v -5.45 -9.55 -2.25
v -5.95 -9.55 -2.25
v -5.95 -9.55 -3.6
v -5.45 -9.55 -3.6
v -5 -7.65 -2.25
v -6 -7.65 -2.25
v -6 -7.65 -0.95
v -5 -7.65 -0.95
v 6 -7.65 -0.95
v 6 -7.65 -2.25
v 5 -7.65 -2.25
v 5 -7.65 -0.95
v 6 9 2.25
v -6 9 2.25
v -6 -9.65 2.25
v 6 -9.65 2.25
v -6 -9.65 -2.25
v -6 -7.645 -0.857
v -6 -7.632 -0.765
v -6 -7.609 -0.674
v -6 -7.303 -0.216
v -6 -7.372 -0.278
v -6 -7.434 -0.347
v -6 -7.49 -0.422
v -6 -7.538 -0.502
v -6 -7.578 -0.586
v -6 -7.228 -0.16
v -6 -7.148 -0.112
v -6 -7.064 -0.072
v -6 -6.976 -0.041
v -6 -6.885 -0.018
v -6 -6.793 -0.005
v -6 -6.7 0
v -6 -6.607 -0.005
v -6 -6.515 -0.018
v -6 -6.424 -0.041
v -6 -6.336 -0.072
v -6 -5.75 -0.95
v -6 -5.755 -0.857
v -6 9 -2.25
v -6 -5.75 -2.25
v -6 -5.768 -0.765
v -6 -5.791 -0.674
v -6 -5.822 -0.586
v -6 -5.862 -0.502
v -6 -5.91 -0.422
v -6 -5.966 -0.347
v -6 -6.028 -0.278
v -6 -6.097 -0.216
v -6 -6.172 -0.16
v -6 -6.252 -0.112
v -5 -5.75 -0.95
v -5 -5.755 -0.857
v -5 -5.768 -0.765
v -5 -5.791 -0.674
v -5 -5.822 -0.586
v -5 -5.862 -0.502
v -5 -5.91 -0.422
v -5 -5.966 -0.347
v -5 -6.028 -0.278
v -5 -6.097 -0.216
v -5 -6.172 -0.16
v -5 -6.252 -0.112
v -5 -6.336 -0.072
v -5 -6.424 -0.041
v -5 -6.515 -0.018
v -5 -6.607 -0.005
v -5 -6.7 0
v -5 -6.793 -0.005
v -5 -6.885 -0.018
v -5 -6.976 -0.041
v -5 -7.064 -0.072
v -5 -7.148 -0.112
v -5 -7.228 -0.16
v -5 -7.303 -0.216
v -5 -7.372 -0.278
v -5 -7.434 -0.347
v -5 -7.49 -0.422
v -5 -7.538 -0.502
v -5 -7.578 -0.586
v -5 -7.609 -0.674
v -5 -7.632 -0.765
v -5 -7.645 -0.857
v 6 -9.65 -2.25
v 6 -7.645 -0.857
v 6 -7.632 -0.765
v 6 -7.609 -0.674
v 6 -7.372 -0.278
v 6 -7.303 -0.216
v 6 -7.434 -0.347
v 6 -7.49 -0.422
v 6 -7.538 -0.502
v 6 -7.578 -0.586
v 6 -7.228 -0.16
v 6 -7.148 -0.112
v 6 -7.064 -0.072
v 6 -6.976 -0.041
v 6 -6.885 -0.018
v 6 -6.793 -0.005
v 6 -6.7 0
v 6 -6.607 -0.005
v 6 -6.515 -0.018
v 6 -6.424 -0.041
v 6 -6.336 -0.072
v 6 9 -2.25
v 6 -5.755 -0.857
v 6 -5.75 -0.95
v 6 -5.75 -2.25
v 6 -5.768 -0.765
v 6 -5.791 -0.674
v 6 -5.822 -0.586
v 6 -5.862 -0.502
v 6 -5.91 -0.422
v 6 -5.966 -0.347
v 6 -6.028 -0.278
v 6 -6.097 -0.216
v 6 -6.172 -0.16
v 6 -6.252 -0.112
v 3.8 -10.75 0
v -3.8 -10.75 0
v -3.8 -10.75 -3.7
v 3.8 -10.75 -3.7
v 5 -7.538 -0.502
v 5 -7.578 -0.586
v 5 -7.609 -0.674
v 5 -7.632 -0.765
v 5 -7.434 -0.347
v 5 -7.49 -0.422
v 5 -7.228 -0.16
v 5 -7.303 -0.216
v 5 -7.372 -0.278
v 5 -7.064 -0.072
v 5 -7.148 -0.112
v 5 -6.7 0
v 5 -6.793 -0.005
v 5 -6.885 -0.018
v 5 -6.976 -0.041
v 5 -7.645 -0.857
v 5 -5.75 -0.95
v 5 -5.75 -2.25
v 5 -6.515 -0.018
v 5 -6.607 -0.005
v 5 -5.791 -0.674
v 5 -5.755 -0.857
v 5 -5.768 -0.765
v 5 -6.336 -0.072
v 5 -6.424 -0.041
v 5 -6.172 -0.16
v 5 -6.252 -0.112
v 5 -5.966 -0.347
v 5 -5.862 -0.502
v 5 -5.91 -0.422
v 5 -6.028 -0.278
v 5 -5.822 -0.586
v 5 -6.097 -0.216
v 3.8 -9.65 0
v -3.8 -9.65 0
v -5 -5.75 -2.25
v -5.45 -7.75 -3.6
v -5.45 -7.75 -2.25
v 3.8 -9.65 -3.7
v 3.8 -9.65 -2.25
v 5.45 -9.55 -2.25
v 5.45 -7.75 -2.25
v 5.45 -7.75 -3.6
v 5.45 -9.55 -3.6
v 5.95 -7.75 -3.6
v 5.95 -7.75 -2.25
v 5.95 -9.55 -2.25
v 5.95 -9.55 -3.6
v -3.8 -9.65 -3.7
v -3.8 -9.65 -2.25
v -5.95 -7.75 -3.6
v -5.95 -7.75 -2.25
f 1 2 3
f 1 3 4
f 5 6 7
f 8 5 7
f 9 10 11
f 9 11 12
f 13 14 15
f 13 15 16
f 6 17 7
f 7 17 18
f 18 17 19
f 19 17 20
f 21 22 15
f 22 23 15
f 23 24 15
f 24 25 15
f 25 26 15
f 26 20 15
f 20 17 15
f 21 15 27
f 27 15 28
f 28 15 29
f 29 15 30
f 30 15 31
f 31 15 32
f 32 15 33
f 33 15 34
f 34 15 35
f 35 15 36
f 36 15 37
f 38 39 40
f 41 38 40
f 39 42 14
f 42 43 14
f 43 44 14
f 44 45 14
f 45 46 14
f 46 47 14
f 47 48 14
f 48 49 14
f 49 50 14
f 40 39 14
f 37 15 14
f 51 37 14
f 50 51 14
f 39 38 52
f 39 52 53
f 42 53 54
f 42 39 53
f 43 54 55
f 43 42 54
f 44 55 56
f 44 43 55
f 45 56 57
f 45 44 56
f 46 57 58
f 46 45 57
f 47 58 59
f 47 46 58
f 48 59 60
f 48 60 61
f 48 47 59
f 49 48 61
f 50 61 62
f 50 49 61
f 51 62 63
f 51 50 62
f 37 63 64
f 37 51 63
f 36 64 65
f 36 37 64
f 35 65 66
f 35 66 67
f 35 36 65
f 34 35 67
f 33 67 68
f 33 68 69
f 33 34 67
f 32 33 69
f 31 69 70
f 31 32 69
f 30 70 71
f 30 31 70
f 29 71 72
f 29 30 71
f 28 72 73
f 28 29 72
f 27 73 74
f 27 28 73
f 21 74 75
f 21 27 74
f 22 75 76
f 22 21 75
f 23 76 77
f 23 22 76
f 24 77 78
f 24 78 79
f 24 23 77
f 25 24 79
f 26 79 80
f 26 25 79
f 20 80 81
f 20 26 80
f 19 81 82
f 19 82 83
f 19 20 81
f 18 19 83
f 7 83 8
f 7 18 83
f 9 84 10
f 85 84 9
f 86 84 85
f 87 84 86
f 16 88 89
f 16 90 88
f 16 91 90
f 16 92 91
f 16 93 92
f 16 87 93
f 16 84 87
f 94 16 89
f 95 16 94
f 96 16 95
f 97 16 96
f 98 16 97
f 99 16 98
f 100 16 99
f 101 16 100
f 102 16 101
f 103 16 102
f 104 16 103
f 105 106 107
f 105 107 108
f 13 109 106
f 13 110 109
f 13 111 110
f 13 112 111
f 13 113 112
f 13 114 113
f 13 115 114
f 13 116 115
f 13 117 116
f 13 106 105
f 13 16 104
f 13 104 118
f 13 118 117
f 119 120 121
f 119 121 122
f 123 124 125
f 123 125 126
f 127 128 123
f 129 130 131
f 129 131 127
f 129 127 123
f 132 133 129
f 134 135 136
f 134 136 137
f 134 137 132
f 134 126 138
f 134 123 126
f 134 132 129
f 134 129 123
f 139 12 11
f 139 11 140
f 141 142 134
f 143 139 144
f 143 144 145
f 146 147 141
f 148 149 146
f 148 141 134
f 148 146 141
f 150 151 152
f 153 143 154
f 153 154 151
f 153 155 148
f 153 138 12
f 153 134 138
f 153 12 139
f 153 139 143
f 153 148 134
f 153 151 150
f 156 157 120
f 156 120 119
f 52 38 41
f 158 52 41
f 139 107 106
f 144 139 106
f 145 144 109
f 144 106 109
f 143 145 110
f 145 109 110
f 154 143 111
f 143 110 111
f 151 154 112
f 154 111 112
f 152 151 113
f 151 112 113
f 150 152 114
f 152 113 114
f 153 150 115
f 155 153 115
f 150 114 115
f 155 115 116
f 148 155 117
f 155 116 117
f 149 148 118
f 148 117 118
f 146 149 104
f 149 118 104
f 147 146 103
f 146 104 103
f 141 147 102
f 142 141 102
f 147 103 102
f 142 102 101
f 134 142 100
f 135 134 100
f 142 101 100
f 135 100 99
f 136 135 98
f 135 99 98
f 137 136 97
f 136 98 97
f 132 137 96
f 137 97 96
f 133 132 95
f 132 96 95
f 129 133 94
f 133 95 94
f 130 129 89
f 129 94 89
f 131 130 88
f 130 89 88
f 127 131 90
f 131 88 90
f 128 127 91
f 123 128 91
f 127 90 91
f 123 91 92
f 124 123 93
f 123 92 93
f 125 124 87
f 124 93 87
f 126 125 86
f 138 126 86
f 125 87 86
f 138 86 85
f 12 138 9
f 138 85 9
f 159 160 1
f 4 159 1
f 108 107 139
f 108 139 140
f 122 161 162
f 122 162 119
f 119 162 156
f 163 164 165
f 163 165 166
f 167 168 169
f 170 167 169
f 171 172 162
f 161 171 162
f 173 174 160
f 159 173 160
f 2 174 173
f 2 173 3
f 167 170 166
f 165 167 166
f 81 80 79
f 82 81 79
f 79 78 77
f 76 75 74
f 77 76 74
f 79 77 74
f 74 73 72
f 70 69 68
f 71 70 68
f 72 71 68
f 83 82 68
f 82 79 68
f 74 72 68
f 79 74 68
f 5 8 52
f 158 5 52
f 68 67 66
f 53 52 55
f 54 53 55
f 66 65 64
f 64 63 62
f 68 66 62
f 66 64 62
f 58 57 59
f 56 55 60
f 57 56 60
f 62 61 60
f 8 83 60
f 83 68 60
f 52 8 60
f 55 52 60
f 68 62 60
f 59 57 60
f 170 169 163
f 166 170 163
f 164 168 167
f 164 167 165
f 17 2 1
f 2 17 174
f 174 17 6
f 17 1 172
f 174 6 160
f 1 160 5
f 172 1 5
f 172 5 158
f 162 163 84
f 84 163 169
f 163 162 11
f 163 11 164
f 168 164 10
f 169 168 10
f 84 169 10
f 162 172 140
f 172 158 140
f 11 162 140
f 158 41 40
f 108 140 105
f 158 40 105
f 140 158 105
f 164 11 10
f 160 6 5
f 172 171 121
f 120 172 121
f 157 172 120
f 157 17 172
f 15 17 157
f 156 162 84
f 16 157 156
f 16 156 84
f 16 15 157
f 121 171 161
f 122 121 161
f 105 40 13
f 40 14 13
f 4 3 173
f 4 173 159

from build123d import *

# Parameters (mm, degrees)
SKETCH006_W     = 12
SKETCH006_H     = 18.65
PAD002_DEPTH    = 2.25
SKETCH007_W     = 7.6
SKETCH007_H     = 3.7
PAD003_DEPTH    = 1.1
SKETCH008_W     = 0.5
SKETCH008_H     = 1.8
PAD004_DEPTH    = 1.35
POCKET003_DEPTH = 1


with BuildPart() as part:
    # Sketch006 → Pad002 (new body, symmetric)
    with BuildSketch(Plane.XY):
        with Locations((0, -0.325)):
            Rectangle(SKETCH006_W, SKETCH006_H)
    extrude(amount=PAD002_DEPTH, both=True)

    # Sketch007 (on Face3 of Pad002) → Pad003 (join)
    with BuildSketch(Plane.XZ.offset(9.65)):
        with Locations((0, -1.85)):
            Rectangle(SKETCH007_W, SKETCH007_H)
    extrude(amount=PAD003_DEPTH)

    # Sketch008 (on Face4 of Pad003) → Pad004 (join)
    with BuildSketch(Plane(origin=(0, 0, -2.25), x_dir=(1, 0, 0), z_dir=(0, 0, -1))):
        with Locations((-5.7, 8.65)):
            Rectangle(SKETCH008_W, SKETCH008_H)
    pad004 = extrude(amount=PAD004_DEPTH)

    # Mirrored: Pad004 across Sketch008 V_Axis
    add(pad004.mirror(Plane(origin=(0, 0, -2.25), x_dir=(0, 0, -1), z_dir=(1, 0, 0))))

    # Sketch009 (on Face3 of Mirrored) → Pocket003 (cut)
    with BuildSketch(Plane.YZ.offset(6)):
        with BuildLine():
            ThreePointArc((-5.75, -0.95), (-6.7, 0), (-7.65, -0.95))
            Line((-7.65, -2.95), (-7.65, -0.95))
            Line((-5.75, -2.95), (-7.65, -2.95))
            Line((-5.75, -0.95), (-5.75, -2.95))
        make_face()
    pocket003 = extrude(amount=-POCKET003_DEPTH, mode=Mode.SUBTRACT)

    # Mirrored001: Pocket003 across YZ
    add(pocket003.mirror(Plane.YZ), mode=Mode.SUBTRACT)


solid = part.part
